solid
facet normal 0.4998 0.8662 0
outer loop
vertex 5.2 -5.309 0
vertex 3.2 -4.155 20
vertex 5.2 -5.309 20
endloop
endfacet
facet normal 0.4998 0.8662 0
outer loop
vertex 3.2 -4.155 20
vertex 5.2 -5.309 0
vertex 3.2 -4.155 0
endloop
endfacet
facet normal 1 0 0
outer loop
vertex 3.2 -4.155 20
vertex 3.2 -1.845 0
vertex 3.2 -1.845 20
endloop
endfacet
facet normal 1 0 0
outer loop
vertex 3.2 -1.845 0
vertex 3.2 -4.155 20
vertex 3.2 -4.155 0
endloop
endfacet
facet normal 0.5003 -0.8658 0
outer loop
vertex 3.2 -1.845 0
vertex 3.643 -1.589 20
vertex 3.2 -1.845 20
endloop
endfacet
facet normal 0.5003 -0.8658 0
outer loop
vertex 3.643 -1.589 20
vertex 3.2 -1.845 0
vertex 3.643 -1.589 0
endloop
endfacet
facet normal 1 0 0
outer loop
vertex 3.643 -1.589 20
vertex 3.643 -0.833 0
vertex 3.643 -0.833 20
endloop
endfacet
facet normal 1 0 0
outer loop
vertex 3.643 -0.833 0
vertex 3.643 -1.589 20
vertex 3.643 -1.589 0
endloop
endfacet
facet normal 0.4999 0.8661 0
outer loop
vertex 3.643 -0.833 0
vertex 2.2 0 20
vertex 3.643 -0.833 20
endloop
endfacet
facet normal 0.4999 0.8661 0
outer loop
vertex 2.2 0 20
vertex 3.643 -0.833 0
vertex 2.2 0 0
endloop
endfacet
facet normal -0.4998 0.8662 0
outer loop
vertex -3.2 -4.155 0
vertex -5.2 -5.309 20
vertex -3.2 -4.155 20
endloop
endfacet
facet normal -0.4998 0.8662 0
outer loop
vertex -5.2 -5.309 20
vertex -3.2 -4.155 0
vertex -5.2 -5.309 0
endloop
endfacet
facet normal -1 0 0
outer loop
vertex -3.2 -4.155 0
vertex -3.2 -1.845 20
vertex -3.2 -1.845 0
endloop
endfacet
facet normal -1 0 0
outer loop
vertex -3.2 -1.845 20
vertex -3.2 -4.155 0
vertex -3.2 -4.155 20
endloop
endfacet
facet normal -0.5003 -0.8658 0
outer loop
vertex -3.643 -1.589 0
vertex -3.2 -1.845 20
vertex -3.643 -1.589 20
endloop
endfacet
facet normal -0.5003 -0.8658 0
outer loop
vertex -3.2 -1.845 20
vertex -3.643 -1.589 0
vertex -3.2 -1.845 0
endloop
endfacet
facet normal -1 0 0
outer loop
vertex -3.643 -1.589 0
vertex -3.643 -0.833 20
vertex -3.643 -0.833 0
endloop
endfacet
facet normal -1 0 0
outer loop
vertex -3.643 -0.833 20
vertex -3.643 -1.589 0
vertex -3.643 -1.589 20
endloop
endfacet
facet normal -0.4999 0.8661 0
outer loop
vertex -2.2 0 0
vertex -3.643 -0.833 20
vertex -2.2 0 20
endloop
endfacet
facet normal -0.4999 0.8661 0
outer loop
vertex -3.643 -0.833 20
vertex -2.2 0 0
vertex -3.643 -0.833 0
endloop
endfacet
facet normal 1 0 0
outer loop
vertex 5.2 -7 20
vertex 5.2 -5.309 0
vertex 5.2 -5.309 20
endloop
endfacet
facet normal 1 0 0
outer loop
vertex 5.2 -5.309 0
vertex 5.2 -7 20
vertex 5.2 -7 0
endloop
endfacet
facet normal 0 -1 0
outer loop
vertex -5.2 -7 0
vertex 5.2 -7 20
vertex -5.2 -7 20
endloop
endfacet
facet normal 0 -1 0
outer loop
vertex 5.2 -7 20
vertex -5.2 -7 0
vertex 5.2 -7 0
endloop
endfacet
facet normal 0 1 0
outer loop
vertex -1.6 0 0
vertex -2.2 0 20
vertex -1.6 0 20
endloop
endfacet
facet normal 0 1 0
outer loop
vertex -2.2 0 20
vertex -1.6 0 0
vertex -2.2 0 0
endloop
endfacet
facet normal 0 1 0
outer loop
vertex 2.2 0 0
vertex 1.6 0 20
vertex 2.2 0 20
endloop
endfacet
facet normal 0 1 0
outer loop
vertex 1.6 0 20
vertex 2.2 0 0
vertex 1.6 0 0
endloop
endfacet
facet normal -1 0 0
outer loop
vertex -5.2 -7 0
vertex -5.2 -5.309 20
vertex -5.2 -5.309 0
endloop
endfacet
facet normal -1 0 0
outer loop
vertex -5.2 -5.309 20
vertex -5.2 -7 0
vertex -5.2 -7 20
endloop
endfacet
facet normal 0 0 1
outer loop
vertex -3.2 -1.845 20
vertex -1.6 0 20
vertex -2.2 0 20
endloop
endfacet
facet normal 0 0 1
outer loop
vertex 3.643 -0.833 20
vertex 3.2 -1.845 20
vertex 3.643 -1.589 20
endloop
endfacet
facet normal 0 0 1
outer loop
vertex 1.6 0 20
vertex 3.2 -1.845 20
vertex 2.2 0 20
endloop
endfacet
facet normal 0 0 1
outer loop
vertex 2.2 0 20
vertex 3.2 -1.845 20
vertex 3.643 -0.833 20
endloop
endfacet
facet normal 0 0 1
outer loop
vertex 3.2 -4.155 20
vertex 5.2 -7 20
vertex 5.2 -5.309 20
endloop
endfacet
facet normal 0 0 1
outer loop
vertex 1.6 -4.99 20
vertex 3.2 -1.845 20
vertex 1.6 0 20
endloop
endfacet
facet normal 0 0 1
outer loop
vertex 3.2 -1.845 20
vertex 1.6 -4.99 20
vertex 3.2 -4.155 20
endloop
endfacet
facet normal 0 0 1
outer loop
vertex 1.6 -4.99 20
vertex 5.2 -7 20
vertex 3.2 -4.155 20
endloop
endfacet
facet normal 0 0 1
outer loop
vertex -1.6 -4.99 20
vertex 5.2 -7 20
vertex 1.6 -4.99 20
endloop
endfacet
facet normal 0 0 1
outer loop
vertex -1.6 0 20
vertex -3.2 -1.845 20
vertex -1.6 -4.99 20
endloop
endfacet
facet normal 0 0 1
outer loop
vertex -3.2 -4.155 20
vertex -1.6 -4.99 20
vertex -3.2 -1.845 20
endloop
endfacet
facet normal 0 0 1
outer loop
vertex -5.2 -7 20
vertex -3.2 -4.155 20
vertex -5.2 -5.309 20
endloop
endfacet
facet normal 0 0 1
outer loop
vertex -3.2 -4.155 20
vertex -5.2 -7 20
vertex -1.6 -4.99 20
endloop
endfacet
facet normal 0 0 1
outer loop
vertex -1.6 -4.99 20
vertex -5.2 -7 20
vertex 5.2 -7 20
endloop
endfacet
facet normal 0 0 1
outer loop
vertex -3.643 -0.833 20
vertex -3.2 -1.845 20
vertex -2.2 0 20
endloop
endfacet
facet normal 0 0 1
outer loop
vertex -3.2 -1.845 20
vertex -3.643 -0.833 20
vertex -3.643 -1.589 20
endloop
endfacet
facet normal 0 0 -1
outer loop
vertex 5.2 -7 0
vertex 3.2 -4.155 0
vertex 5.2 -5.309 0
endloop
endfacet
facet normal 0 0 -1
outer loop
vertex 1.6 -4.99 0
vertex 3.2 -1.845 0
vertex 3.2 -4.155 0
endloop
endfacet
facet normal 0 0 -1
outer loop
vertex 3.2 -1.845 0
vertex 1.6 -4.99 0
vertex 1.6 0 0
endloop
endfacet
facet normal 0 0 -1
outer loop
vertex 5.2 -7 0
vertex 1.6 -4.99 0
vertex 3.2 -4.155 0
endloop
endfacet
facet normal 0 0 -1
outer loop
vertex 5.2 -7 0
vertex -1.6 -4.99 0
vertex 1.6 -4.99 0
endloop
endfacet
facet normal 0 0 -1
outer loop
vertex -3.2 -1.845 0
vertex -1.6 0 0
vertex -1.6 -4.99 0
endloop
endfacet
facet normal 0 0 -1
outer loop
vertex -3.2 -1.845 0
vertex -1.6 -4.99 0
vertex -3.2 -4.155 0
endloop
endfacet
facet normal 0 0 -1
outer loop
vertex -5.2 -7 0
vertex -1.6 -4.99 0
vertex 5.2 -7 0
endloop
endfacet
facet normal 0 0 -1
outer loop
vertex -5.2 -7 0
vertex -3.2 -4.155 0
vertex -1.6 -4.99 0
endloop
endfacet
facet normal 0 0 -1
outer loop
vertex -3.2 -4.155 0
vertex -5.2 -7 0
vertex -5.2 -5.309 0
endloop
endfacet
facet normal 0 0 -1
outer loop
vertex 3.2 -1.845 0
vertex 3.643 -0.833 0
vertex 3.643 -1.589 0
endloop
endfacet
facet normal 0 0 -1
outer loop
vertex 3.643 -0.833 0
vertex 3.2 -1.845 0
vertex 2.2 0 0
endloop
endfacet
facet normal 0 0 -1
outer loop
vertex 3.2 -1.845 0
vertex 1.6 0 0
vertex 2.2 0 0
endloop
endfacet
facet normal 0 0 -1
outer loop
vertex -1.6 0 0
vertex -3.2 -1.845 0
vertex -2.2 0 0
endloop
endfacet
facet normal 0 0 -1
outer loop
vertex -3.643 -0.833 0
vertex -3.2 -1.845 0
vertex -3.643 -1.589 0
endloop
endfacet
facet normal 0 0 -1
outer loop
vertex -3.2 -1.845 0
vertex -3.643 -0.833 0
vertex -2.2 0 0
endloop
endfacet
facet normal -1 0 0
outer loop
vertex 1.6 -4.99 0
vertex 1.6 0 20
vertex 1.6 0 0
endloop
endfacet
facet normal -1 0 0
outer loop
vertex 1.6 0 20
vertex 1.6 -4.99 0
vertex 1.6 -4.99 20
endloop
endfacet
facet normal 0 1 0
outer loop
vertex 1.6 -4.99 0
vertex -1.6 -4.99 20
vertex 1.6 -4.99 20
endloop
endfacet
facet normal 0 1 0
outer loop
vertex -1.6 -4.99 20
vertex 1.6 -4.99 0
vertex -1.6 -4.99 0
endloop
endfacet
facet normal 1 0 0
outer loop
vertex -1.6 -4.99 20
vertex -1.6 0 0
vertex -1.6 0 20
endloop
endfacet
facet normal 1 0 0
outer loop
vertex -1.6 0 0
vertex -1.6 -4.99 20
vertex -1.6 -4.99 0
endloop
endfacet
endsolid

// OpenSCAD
slot_snap();

module slot_snap(){
	slot_w = 6.4;
	slot_h = 2;
	slot_b = 1;

	width = slot_w+4;
	length = 20;
	height = slot_h*3+1;

	%cube([2,2,40], center=true);

	rad = (width-slot_w)/2;

	//translate([0,0,height]) mirror([0,0,1]) //pins up
	translate([0,0,length/2]) rotate([90,0,0]) //vertical
	difference(){
		translate([0,0,height/2]) cube([width, length, height],center=true);
		for(i=[0:1]) mirror([i,0,0]){
			translate([width/2, 0, slot_b+rad]) rotate([90,0,0]) rotate([0,0,180/6]) cylinder(r=rad/cos(30), h=length+1, center=true, $fn=6);

			translate([width/2+.66, 0, slot_b]) rotate([90,0,0]) rotate([0,0,180/6]) cylinder(r=rad/cos(30)+.25, h=length+1, center=true, $fn=6);
	
			translate([width/2-slot_b, 0, -rad/2/cos(30)]) rotate([90,0,0]) rotate([0,0,180/6]) cylinder(r=rad/cos(30), h=length+1, center=true, $fn=6);
		}

		translate([0,0,(height-slot_h)/2-.01]) cube([slot_w/2, length+1, height-slot_h],center=true);
	}
}
